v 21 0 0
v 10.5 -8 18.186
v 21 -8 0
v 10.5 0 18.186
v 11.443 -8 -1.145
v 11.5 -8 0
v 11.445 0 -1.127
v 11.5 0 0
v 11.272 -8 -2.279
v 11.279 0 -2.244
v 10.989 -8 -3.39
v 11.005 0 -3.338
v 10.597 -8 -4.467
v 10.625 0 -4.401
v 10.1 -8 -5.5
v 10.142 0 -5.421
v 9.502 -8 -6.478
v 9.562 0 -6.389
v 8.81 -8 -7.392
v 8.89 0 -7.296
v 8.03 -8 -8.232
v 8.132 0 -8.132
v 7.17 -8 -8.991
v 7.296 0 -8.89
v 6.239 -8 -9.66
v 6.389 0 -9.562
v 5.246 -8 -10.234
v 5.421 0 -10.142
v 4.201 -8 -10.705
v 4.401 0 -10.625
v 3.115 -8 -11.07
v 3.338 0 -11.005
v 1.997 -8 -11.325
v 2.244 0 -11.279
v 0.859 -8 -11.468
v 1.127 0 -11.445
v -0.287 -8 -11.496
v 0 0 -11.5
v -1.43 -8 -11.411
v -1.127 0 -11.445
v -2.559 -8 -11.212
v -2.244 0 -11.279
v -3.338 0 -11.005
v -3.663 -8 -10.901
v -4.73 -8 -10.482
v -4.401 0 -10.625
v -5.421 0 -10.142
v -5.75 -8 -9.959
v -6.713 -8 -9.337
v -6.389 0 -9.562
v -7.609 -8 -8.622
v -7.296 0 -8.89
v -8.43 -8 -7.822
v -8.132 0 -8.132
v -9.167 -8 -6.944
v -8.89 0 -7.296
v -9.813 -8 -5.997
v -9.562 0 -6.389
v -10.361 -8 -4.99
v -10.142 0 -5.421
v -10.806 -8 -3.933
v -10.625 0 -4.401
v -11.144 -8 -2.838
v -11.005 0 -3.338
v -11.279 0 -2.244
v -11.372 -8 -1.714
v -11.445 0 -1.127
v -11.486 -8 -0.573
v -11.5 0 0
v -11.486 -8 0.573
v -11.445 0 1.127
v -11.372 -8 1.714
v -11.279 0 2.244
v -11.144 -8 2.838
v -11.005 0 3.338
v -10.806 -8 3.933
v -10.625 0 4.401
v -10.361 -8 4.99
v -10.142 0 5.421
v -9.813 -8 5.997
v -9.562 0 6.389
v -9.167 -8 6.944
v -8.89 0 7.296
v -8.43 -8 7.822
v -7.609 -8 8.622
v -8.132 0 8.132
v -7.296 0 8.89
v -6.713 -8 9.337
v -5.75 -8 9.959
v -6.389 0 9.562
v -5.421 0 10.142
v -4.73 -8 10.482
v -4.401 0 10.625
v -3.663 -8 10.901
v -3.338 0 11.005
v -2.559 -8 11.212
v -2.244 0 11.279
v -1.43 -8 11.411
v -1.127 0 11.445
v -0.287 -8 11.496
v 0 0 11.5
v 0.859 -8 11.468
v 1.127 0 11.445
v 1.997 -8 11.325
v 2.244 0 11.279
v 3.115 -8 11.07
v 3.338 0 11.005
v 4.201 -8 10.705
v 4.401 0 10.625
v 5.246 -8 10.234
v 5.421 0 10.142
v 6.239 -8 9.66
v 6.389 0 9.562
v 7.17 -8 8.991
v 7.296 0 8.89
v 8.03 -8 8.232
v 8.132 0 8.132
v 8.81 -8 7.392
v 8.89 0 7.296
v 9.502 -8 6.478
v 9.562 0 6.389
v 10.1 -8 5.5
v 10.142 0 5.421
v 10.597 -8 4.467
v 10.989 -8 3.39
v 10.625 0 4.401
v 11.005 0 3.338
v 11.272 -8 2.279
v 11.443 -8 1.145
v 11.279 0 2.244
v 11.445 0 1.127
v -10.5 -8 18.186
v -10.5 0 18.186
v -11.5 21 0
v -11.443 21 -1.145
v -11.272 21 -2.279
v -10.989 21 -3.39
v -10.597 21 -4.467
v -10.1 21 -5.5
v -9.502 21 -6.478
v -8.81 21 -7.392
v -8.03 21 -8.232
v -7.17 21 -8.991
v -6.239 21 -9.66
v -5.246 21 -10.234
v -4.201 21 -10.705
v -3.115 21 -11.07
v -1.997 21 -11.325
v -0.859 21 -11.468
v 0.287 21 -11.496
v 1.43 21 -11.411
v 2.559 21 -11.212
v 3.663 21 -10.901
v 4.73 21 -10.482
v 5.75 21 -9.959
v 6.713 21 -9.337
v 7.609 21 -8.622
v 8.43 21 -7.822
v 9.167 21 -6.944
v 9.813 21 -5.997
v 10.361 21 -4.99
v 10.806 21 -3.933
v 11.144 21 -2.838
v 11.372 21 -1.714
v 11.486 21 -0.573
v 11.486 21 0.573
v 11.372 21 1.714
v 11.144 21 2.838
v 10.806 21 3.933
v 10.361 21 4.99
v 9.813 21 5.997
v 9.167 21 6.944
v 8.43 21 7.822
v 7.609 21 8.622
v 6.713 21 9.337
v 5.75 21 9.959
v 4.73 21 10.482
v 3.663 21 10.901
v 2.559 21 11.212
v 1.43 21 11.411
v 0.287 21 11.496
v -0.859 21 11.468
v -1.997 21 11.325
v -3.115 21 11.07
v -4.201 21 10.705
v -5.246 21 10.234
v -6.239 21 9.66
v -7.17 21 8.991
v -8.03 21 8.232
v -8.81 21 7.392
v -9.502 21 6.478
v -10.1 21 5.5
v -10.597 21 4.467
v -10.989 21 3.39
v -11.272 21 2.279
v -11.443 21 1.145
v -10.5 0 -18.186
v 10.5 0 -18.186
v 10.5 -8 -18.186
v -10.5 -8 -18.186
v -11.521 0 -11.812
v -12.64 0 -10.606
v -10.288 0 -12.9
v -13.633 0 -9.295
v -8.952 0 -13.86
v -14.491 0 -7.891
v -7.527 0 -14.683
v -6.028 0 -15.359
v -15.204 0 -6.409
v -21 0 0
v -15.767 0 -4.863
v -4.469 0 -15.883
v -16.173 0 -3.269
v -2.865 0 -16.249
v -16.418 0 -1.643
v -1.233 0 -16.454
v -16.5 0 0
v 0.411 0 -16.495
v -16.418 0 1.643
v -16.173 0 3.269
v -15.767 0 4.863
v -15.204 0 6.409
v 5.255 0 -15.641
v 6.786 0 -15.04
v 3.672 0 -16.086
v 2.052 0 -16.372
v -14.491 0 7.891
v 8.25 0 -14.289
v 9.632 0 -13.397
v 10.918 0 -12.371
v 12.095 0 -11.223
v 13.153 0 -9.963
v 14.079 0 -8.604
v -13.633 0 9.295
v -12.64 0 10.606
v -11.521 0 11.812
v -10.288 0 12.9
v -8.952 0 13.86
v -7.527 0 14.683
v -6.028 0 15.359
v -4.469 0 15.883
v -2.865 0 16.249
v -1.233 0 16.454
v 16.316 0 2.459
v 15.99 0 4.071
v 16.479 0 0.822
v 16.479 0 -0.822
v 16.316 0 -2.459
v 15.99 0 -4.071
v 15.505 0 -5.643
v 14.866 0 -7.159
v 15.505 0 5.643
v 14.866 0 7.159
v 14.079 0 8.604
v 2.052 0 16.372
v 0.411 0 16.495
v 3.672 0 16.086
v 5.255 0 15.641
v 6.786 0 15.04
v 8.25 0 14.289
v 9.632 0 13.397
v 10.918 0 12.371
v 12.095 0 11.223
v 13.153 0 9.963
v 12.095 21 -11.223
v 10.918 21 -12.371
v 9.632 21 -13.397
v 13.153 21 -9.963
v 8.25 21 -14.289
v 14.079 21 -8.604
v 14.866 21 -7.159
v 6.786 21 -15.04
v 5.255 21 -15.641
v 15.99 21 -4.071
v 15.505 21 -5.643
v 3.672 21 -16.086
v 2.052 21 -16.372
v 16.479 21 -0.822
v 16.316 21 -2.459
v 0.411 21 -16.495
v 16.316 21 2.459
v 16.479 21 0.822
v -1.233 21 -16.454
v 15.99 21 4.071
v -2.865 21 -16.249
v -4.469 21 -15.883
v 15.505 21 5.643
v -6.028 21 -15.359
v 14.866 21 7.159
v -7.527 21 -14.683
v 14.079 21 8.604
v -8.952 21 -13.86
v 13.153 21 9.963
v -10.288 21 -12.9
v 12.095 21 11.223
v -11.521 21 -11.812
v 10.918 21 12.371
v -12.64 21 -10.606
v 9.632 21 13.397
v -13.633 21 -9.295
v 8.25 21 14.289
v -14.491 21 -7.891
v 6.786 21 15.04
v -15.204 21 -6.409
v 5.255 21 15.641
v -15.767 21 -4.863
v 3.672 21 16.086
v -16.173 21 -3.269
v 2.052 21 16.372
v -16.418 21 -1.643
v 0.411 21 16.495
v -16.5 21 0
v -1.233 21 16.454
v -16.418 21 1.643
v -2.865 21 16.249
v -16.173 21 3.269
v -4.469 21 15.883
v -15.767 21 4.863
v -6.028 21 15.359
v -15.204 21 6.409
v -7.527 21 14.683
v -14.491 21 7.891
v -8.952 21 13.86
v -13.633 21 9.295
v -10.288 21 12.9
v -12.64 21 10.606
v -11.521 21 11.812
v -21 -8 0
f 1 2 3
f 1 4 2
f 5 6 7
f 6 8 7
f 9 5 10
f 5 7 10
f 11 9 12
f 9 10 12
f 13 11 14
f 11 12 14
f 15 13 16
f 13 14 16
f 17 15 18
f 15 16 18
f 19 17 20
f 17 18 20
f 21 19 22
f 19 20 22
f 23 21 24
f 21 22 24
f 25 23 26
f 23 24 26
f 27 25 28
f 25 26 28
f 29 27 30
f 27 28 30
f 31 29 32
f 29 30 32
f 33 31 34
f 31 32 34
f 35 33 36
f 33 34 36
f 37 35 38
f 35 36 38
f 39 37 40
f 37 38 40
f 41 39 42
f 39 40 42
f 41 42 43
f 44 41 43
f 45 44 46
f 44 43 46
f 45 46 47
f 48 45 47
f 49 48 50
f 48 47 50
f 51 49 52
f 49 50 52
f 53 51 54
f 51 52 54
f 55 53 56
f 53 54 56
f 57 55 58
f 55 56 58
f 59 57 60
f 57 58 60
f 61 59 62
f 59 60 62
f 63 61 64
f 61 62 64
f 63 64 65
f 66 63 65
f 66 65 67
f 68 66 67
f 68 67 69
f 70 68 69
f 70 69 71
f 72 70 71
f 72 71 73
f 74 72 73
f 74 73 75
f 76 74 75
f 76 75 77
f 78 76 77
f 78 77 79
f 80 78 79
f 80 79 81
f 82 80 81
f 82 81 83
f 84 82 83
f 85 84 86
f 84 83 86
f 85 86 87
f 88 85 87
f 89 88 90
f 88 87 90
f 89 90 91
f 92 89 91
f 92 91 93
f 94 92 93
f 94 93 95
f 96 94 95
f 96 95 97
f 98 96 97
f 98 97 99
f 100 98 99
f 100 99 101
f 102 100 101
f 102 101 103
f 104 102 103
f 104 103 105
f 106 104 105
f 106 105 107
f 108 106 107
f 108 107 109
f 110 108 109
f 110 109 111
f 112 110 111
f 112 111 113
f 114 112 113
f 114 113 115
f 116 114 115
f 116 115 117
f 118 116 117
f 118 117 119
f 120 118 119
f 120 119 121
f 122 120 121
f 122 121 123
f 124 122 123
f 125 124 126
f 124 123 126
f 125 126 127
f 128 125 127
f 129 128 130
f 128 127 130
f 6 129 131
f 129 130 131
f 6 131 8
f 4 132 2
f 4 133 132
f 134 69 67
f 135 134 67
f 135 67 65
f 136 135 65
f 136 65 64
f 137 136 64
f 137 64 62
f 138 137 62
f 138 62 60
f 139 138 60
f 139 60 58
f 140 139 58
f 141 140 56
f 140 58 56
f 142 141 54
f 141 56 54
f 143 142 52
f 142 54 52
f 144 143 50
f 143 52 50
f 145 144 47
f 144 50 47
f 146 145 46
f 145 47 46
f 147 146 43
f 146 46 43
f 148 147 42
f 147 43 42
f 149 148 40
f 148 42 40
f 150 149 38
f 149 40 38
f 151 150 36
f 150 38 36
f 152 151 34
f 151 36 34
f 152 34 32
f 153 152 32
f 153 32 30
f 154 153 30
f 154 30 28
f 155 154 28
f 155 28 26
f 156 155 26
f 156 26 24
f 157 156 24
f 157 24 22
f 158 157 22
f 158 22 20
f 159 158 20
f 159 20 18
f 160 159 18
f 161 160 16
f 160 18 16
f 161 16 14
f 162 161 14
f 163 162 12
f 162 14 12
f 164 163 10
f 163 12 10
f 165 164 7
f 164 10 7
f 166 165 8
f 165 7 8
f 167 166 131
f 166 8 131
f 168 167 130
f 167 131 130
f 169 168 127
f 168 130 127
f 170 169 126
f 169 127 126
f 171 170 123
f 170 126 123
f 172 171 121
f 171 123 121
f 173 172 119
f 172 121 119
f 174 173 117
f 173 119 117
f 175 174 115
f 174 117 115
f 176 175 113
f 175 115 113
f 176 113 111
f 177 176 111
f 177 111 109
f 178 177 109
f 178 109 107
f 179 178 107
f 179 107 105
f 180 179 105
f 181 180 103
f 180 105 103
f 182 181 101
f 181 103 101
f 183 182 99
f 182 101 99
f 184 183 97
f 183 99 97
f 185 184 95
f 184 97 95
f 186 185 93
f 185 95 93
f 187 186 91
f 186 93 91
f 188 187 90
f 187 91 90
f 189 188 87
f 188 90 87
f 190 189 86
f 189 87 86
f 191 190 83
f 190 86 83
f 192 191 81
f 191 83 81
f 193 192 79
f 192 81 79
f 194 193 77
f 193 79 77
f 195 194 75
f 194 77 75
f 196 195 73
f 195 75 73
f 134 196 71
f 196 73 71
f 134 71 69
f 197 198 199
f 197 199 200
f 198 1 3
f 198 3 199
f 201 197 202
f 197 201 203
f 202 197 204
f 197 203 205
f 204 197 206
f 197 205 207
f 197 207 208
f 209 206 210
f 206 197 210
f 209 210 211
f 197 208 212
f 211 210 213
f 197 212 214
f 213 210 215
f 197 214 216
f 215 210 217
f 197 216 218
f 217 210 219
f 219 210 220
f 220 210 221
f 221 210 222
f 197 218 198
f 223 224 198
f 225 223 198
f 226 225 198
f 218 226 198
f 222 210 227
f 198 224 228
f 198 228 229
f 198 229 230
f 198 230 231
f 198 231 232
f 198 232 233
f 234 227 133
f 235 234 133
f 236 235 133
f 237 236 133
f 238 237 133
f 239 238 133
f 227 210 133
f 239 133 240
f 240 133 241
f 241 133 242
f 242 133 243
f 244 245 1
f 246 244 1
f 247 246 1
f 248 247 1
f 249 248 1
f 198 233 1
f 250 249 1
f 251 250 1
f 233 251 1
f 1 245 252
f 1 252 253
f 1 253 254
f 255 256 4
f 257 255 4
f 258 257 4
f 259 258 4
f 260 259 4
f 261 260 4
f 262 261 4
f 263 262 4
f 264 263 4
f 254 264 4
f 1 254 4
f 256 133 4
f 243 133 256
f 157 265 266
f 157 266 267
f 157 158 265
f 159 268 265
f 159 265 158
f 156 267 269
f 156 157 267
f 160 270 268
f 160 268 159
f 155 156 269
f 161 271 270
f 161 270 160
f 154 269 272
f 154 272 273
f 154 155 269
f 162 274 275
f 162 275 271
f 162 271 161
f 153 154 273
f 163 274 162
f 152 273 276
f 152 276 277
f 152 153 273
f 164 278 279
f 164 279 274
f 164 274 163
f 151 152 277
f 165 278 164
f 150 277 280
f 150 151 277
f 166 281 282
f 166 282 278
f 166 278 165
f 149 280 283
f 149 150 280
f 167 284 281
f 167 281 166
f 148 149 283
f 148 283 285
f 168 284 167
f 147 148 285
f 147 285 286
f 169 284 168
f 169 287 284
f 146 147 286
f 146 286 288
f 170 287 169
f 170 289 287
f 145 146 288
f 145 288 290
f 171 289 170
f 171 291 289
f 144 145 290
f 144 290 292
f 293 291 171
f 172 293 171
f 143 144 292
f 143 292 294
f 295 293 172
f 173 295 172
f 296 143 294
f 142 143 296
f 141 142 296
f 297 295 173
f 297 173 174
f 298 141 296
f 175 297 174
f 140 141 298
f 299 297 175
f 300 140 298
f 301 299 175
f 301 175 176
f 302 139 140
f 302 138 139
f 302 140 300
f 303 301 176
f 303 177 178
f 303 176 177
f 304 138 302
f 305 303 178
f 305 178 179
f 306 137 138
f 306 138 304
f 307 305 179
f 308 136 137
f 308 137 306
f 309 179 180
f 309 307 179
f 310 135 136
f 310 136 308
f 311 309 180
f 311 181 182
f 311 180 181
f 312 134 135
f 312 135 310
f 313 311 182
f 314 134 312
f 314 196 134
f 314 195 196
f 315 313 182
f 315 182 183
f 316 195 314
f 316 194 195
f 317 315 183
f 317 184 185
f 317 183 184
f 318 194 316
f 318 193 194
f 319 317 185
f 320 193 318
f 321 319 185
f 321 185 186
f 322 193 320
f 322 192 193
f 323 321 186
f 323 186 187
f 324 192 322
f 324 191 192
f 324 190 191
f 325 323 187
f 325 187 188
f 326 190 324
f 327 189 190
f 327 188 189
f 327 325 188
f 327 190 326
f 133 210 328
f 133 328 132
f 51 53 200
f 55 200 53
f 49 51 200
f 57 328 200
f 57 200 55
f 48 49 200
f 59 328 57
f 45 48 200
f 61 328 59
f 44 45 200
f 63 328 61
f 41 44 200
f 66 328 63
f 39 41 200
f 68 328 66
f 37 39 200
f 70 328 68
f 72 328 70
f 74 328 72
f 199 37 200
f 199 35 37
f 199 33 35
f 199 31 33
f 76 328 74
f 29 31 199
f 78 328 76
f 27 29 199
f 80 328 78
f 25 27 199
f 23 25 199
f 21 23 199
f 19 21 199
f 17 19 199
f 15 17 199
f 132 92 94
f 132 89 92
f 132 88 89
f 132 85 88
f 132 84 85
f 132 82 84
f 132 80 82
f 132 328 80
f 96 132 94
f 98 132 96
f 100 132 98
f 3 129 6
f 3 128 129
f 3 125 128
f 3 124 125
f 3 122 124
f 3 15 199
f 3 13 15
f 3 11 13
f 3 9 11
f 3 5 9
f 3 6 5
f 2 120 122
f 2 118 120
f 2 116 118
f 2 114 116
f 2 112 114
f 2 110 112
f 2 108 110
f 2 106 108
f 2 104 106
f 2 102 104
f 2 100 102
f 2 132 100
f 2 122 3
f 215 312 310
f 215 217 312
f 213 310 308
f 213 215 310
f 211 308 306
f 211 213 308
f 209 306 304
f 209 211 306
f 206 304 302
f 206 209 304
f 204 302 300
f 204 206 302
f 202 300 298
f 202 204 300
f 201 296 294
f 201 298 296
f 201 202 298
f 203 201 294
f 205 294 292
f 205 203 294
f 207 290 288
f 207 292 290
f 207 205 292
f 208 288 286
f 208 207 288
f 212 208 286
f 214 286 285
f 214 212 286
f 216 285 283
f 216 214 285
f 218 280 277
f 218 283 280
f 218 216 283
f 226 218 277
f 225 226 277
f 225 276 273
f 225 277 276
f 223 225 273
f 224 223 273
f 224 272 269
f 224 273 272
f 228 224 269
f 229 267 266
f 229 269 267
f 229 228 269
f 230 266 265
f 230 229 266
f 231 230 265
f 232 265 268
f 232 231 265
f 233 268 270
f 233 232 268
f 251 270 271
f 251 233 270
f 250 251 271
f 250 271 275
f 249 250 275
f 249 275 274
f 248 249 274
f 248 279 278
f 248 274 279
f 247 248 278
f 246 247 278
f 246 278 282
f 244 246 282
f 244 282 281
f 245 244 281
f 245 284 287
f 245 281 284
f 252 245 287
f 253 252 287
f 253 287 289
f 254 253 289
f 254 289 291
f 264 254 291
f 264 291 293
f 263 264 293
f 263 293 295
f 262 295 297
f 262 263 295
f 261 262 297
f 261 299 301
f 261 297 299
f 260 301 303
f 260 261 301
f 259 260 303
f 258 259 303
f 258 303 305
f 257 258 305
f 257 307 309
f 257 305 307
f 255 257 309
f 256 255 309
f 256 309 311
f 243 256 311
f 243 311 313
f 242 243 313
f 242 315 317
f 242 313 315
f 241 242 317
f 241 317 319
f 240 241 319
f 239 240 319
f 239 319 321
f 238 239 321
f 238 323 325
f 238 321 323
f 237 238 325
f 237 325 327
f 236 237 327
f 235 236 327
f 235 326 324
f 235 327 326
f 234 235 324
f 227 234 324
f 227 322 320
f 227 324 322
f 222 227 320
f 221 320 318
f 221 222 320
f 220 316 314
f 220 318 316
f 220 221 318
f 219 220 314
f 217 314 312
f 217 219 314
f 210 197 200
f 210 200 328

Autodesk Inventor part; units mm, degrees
ref_plane "YZ Plane" through (0, 0, 0) normal (1, 0, 0) x (0, 1, 0)
ref_plane "XZ Plane" through (0, 0, 0) normal (0, 1, 0) x (-1, 0, 0)
ref_plane "XY Plane" through (0, 0, 0) normal (0, 0, 1) x (1, 0, 0)
sketch "Sketch1" plane through (0, 0, 0) normal (0, 1, 0) x (-1, 0, 0)
  circle A0 centre (0, 0) radius 16.5
  circle A1 centre (0, 0) radius 11.5
  dimension "d0" = 33
  dimension "d1" = 23
extrude "tappedEnd" add sketch "Sketch1" along normal blind 21
thread "Thread1" size "3/4" designation "3/4 - 14 NPT" standard "NPT for PVC Pipe and Fitting" length 20.155
sketch "Sketch2" plane through (0, 0, 0) normal (0, -1, 0) x (1, 0, 0)
  circle A0 centre (0, 0) radius 21 construction
  line L0 (-10.5, 18.1865) -> (10.5, 18.1865)
  line L1 (10.5, 18.1865) -> (21, 0)
  line L2 (21, 0) -> (10.5, -18.1865)
  line L3 (10.5, -18.1865) -> (-10.5, -18.1865)
  line L4 (-10.5, -18.1865) -> (-21, 0)
  line L5 (-21, 0) -> (-10.5, 18.1865)
  circle A1 centre (0, 0) radius 11.5 projected
  dimension "d6" = 42
extrude "hexBit" add sketch "Sketch2" along normal blind 8
sketch "Sketch3" plane through (0, -8, 0) normal (0, -1, 0) x (1, 0, 0)
  circle A0 centre (0, 0) radius 11.5 projected
  circle A1 centre (0, 0) radius 16.5
  dimension "d9" = 33
extrude "Extrusion3" [suppressed]
properties part number "PVCConnectorFemale3_4inch" material "PVC-Piping"
